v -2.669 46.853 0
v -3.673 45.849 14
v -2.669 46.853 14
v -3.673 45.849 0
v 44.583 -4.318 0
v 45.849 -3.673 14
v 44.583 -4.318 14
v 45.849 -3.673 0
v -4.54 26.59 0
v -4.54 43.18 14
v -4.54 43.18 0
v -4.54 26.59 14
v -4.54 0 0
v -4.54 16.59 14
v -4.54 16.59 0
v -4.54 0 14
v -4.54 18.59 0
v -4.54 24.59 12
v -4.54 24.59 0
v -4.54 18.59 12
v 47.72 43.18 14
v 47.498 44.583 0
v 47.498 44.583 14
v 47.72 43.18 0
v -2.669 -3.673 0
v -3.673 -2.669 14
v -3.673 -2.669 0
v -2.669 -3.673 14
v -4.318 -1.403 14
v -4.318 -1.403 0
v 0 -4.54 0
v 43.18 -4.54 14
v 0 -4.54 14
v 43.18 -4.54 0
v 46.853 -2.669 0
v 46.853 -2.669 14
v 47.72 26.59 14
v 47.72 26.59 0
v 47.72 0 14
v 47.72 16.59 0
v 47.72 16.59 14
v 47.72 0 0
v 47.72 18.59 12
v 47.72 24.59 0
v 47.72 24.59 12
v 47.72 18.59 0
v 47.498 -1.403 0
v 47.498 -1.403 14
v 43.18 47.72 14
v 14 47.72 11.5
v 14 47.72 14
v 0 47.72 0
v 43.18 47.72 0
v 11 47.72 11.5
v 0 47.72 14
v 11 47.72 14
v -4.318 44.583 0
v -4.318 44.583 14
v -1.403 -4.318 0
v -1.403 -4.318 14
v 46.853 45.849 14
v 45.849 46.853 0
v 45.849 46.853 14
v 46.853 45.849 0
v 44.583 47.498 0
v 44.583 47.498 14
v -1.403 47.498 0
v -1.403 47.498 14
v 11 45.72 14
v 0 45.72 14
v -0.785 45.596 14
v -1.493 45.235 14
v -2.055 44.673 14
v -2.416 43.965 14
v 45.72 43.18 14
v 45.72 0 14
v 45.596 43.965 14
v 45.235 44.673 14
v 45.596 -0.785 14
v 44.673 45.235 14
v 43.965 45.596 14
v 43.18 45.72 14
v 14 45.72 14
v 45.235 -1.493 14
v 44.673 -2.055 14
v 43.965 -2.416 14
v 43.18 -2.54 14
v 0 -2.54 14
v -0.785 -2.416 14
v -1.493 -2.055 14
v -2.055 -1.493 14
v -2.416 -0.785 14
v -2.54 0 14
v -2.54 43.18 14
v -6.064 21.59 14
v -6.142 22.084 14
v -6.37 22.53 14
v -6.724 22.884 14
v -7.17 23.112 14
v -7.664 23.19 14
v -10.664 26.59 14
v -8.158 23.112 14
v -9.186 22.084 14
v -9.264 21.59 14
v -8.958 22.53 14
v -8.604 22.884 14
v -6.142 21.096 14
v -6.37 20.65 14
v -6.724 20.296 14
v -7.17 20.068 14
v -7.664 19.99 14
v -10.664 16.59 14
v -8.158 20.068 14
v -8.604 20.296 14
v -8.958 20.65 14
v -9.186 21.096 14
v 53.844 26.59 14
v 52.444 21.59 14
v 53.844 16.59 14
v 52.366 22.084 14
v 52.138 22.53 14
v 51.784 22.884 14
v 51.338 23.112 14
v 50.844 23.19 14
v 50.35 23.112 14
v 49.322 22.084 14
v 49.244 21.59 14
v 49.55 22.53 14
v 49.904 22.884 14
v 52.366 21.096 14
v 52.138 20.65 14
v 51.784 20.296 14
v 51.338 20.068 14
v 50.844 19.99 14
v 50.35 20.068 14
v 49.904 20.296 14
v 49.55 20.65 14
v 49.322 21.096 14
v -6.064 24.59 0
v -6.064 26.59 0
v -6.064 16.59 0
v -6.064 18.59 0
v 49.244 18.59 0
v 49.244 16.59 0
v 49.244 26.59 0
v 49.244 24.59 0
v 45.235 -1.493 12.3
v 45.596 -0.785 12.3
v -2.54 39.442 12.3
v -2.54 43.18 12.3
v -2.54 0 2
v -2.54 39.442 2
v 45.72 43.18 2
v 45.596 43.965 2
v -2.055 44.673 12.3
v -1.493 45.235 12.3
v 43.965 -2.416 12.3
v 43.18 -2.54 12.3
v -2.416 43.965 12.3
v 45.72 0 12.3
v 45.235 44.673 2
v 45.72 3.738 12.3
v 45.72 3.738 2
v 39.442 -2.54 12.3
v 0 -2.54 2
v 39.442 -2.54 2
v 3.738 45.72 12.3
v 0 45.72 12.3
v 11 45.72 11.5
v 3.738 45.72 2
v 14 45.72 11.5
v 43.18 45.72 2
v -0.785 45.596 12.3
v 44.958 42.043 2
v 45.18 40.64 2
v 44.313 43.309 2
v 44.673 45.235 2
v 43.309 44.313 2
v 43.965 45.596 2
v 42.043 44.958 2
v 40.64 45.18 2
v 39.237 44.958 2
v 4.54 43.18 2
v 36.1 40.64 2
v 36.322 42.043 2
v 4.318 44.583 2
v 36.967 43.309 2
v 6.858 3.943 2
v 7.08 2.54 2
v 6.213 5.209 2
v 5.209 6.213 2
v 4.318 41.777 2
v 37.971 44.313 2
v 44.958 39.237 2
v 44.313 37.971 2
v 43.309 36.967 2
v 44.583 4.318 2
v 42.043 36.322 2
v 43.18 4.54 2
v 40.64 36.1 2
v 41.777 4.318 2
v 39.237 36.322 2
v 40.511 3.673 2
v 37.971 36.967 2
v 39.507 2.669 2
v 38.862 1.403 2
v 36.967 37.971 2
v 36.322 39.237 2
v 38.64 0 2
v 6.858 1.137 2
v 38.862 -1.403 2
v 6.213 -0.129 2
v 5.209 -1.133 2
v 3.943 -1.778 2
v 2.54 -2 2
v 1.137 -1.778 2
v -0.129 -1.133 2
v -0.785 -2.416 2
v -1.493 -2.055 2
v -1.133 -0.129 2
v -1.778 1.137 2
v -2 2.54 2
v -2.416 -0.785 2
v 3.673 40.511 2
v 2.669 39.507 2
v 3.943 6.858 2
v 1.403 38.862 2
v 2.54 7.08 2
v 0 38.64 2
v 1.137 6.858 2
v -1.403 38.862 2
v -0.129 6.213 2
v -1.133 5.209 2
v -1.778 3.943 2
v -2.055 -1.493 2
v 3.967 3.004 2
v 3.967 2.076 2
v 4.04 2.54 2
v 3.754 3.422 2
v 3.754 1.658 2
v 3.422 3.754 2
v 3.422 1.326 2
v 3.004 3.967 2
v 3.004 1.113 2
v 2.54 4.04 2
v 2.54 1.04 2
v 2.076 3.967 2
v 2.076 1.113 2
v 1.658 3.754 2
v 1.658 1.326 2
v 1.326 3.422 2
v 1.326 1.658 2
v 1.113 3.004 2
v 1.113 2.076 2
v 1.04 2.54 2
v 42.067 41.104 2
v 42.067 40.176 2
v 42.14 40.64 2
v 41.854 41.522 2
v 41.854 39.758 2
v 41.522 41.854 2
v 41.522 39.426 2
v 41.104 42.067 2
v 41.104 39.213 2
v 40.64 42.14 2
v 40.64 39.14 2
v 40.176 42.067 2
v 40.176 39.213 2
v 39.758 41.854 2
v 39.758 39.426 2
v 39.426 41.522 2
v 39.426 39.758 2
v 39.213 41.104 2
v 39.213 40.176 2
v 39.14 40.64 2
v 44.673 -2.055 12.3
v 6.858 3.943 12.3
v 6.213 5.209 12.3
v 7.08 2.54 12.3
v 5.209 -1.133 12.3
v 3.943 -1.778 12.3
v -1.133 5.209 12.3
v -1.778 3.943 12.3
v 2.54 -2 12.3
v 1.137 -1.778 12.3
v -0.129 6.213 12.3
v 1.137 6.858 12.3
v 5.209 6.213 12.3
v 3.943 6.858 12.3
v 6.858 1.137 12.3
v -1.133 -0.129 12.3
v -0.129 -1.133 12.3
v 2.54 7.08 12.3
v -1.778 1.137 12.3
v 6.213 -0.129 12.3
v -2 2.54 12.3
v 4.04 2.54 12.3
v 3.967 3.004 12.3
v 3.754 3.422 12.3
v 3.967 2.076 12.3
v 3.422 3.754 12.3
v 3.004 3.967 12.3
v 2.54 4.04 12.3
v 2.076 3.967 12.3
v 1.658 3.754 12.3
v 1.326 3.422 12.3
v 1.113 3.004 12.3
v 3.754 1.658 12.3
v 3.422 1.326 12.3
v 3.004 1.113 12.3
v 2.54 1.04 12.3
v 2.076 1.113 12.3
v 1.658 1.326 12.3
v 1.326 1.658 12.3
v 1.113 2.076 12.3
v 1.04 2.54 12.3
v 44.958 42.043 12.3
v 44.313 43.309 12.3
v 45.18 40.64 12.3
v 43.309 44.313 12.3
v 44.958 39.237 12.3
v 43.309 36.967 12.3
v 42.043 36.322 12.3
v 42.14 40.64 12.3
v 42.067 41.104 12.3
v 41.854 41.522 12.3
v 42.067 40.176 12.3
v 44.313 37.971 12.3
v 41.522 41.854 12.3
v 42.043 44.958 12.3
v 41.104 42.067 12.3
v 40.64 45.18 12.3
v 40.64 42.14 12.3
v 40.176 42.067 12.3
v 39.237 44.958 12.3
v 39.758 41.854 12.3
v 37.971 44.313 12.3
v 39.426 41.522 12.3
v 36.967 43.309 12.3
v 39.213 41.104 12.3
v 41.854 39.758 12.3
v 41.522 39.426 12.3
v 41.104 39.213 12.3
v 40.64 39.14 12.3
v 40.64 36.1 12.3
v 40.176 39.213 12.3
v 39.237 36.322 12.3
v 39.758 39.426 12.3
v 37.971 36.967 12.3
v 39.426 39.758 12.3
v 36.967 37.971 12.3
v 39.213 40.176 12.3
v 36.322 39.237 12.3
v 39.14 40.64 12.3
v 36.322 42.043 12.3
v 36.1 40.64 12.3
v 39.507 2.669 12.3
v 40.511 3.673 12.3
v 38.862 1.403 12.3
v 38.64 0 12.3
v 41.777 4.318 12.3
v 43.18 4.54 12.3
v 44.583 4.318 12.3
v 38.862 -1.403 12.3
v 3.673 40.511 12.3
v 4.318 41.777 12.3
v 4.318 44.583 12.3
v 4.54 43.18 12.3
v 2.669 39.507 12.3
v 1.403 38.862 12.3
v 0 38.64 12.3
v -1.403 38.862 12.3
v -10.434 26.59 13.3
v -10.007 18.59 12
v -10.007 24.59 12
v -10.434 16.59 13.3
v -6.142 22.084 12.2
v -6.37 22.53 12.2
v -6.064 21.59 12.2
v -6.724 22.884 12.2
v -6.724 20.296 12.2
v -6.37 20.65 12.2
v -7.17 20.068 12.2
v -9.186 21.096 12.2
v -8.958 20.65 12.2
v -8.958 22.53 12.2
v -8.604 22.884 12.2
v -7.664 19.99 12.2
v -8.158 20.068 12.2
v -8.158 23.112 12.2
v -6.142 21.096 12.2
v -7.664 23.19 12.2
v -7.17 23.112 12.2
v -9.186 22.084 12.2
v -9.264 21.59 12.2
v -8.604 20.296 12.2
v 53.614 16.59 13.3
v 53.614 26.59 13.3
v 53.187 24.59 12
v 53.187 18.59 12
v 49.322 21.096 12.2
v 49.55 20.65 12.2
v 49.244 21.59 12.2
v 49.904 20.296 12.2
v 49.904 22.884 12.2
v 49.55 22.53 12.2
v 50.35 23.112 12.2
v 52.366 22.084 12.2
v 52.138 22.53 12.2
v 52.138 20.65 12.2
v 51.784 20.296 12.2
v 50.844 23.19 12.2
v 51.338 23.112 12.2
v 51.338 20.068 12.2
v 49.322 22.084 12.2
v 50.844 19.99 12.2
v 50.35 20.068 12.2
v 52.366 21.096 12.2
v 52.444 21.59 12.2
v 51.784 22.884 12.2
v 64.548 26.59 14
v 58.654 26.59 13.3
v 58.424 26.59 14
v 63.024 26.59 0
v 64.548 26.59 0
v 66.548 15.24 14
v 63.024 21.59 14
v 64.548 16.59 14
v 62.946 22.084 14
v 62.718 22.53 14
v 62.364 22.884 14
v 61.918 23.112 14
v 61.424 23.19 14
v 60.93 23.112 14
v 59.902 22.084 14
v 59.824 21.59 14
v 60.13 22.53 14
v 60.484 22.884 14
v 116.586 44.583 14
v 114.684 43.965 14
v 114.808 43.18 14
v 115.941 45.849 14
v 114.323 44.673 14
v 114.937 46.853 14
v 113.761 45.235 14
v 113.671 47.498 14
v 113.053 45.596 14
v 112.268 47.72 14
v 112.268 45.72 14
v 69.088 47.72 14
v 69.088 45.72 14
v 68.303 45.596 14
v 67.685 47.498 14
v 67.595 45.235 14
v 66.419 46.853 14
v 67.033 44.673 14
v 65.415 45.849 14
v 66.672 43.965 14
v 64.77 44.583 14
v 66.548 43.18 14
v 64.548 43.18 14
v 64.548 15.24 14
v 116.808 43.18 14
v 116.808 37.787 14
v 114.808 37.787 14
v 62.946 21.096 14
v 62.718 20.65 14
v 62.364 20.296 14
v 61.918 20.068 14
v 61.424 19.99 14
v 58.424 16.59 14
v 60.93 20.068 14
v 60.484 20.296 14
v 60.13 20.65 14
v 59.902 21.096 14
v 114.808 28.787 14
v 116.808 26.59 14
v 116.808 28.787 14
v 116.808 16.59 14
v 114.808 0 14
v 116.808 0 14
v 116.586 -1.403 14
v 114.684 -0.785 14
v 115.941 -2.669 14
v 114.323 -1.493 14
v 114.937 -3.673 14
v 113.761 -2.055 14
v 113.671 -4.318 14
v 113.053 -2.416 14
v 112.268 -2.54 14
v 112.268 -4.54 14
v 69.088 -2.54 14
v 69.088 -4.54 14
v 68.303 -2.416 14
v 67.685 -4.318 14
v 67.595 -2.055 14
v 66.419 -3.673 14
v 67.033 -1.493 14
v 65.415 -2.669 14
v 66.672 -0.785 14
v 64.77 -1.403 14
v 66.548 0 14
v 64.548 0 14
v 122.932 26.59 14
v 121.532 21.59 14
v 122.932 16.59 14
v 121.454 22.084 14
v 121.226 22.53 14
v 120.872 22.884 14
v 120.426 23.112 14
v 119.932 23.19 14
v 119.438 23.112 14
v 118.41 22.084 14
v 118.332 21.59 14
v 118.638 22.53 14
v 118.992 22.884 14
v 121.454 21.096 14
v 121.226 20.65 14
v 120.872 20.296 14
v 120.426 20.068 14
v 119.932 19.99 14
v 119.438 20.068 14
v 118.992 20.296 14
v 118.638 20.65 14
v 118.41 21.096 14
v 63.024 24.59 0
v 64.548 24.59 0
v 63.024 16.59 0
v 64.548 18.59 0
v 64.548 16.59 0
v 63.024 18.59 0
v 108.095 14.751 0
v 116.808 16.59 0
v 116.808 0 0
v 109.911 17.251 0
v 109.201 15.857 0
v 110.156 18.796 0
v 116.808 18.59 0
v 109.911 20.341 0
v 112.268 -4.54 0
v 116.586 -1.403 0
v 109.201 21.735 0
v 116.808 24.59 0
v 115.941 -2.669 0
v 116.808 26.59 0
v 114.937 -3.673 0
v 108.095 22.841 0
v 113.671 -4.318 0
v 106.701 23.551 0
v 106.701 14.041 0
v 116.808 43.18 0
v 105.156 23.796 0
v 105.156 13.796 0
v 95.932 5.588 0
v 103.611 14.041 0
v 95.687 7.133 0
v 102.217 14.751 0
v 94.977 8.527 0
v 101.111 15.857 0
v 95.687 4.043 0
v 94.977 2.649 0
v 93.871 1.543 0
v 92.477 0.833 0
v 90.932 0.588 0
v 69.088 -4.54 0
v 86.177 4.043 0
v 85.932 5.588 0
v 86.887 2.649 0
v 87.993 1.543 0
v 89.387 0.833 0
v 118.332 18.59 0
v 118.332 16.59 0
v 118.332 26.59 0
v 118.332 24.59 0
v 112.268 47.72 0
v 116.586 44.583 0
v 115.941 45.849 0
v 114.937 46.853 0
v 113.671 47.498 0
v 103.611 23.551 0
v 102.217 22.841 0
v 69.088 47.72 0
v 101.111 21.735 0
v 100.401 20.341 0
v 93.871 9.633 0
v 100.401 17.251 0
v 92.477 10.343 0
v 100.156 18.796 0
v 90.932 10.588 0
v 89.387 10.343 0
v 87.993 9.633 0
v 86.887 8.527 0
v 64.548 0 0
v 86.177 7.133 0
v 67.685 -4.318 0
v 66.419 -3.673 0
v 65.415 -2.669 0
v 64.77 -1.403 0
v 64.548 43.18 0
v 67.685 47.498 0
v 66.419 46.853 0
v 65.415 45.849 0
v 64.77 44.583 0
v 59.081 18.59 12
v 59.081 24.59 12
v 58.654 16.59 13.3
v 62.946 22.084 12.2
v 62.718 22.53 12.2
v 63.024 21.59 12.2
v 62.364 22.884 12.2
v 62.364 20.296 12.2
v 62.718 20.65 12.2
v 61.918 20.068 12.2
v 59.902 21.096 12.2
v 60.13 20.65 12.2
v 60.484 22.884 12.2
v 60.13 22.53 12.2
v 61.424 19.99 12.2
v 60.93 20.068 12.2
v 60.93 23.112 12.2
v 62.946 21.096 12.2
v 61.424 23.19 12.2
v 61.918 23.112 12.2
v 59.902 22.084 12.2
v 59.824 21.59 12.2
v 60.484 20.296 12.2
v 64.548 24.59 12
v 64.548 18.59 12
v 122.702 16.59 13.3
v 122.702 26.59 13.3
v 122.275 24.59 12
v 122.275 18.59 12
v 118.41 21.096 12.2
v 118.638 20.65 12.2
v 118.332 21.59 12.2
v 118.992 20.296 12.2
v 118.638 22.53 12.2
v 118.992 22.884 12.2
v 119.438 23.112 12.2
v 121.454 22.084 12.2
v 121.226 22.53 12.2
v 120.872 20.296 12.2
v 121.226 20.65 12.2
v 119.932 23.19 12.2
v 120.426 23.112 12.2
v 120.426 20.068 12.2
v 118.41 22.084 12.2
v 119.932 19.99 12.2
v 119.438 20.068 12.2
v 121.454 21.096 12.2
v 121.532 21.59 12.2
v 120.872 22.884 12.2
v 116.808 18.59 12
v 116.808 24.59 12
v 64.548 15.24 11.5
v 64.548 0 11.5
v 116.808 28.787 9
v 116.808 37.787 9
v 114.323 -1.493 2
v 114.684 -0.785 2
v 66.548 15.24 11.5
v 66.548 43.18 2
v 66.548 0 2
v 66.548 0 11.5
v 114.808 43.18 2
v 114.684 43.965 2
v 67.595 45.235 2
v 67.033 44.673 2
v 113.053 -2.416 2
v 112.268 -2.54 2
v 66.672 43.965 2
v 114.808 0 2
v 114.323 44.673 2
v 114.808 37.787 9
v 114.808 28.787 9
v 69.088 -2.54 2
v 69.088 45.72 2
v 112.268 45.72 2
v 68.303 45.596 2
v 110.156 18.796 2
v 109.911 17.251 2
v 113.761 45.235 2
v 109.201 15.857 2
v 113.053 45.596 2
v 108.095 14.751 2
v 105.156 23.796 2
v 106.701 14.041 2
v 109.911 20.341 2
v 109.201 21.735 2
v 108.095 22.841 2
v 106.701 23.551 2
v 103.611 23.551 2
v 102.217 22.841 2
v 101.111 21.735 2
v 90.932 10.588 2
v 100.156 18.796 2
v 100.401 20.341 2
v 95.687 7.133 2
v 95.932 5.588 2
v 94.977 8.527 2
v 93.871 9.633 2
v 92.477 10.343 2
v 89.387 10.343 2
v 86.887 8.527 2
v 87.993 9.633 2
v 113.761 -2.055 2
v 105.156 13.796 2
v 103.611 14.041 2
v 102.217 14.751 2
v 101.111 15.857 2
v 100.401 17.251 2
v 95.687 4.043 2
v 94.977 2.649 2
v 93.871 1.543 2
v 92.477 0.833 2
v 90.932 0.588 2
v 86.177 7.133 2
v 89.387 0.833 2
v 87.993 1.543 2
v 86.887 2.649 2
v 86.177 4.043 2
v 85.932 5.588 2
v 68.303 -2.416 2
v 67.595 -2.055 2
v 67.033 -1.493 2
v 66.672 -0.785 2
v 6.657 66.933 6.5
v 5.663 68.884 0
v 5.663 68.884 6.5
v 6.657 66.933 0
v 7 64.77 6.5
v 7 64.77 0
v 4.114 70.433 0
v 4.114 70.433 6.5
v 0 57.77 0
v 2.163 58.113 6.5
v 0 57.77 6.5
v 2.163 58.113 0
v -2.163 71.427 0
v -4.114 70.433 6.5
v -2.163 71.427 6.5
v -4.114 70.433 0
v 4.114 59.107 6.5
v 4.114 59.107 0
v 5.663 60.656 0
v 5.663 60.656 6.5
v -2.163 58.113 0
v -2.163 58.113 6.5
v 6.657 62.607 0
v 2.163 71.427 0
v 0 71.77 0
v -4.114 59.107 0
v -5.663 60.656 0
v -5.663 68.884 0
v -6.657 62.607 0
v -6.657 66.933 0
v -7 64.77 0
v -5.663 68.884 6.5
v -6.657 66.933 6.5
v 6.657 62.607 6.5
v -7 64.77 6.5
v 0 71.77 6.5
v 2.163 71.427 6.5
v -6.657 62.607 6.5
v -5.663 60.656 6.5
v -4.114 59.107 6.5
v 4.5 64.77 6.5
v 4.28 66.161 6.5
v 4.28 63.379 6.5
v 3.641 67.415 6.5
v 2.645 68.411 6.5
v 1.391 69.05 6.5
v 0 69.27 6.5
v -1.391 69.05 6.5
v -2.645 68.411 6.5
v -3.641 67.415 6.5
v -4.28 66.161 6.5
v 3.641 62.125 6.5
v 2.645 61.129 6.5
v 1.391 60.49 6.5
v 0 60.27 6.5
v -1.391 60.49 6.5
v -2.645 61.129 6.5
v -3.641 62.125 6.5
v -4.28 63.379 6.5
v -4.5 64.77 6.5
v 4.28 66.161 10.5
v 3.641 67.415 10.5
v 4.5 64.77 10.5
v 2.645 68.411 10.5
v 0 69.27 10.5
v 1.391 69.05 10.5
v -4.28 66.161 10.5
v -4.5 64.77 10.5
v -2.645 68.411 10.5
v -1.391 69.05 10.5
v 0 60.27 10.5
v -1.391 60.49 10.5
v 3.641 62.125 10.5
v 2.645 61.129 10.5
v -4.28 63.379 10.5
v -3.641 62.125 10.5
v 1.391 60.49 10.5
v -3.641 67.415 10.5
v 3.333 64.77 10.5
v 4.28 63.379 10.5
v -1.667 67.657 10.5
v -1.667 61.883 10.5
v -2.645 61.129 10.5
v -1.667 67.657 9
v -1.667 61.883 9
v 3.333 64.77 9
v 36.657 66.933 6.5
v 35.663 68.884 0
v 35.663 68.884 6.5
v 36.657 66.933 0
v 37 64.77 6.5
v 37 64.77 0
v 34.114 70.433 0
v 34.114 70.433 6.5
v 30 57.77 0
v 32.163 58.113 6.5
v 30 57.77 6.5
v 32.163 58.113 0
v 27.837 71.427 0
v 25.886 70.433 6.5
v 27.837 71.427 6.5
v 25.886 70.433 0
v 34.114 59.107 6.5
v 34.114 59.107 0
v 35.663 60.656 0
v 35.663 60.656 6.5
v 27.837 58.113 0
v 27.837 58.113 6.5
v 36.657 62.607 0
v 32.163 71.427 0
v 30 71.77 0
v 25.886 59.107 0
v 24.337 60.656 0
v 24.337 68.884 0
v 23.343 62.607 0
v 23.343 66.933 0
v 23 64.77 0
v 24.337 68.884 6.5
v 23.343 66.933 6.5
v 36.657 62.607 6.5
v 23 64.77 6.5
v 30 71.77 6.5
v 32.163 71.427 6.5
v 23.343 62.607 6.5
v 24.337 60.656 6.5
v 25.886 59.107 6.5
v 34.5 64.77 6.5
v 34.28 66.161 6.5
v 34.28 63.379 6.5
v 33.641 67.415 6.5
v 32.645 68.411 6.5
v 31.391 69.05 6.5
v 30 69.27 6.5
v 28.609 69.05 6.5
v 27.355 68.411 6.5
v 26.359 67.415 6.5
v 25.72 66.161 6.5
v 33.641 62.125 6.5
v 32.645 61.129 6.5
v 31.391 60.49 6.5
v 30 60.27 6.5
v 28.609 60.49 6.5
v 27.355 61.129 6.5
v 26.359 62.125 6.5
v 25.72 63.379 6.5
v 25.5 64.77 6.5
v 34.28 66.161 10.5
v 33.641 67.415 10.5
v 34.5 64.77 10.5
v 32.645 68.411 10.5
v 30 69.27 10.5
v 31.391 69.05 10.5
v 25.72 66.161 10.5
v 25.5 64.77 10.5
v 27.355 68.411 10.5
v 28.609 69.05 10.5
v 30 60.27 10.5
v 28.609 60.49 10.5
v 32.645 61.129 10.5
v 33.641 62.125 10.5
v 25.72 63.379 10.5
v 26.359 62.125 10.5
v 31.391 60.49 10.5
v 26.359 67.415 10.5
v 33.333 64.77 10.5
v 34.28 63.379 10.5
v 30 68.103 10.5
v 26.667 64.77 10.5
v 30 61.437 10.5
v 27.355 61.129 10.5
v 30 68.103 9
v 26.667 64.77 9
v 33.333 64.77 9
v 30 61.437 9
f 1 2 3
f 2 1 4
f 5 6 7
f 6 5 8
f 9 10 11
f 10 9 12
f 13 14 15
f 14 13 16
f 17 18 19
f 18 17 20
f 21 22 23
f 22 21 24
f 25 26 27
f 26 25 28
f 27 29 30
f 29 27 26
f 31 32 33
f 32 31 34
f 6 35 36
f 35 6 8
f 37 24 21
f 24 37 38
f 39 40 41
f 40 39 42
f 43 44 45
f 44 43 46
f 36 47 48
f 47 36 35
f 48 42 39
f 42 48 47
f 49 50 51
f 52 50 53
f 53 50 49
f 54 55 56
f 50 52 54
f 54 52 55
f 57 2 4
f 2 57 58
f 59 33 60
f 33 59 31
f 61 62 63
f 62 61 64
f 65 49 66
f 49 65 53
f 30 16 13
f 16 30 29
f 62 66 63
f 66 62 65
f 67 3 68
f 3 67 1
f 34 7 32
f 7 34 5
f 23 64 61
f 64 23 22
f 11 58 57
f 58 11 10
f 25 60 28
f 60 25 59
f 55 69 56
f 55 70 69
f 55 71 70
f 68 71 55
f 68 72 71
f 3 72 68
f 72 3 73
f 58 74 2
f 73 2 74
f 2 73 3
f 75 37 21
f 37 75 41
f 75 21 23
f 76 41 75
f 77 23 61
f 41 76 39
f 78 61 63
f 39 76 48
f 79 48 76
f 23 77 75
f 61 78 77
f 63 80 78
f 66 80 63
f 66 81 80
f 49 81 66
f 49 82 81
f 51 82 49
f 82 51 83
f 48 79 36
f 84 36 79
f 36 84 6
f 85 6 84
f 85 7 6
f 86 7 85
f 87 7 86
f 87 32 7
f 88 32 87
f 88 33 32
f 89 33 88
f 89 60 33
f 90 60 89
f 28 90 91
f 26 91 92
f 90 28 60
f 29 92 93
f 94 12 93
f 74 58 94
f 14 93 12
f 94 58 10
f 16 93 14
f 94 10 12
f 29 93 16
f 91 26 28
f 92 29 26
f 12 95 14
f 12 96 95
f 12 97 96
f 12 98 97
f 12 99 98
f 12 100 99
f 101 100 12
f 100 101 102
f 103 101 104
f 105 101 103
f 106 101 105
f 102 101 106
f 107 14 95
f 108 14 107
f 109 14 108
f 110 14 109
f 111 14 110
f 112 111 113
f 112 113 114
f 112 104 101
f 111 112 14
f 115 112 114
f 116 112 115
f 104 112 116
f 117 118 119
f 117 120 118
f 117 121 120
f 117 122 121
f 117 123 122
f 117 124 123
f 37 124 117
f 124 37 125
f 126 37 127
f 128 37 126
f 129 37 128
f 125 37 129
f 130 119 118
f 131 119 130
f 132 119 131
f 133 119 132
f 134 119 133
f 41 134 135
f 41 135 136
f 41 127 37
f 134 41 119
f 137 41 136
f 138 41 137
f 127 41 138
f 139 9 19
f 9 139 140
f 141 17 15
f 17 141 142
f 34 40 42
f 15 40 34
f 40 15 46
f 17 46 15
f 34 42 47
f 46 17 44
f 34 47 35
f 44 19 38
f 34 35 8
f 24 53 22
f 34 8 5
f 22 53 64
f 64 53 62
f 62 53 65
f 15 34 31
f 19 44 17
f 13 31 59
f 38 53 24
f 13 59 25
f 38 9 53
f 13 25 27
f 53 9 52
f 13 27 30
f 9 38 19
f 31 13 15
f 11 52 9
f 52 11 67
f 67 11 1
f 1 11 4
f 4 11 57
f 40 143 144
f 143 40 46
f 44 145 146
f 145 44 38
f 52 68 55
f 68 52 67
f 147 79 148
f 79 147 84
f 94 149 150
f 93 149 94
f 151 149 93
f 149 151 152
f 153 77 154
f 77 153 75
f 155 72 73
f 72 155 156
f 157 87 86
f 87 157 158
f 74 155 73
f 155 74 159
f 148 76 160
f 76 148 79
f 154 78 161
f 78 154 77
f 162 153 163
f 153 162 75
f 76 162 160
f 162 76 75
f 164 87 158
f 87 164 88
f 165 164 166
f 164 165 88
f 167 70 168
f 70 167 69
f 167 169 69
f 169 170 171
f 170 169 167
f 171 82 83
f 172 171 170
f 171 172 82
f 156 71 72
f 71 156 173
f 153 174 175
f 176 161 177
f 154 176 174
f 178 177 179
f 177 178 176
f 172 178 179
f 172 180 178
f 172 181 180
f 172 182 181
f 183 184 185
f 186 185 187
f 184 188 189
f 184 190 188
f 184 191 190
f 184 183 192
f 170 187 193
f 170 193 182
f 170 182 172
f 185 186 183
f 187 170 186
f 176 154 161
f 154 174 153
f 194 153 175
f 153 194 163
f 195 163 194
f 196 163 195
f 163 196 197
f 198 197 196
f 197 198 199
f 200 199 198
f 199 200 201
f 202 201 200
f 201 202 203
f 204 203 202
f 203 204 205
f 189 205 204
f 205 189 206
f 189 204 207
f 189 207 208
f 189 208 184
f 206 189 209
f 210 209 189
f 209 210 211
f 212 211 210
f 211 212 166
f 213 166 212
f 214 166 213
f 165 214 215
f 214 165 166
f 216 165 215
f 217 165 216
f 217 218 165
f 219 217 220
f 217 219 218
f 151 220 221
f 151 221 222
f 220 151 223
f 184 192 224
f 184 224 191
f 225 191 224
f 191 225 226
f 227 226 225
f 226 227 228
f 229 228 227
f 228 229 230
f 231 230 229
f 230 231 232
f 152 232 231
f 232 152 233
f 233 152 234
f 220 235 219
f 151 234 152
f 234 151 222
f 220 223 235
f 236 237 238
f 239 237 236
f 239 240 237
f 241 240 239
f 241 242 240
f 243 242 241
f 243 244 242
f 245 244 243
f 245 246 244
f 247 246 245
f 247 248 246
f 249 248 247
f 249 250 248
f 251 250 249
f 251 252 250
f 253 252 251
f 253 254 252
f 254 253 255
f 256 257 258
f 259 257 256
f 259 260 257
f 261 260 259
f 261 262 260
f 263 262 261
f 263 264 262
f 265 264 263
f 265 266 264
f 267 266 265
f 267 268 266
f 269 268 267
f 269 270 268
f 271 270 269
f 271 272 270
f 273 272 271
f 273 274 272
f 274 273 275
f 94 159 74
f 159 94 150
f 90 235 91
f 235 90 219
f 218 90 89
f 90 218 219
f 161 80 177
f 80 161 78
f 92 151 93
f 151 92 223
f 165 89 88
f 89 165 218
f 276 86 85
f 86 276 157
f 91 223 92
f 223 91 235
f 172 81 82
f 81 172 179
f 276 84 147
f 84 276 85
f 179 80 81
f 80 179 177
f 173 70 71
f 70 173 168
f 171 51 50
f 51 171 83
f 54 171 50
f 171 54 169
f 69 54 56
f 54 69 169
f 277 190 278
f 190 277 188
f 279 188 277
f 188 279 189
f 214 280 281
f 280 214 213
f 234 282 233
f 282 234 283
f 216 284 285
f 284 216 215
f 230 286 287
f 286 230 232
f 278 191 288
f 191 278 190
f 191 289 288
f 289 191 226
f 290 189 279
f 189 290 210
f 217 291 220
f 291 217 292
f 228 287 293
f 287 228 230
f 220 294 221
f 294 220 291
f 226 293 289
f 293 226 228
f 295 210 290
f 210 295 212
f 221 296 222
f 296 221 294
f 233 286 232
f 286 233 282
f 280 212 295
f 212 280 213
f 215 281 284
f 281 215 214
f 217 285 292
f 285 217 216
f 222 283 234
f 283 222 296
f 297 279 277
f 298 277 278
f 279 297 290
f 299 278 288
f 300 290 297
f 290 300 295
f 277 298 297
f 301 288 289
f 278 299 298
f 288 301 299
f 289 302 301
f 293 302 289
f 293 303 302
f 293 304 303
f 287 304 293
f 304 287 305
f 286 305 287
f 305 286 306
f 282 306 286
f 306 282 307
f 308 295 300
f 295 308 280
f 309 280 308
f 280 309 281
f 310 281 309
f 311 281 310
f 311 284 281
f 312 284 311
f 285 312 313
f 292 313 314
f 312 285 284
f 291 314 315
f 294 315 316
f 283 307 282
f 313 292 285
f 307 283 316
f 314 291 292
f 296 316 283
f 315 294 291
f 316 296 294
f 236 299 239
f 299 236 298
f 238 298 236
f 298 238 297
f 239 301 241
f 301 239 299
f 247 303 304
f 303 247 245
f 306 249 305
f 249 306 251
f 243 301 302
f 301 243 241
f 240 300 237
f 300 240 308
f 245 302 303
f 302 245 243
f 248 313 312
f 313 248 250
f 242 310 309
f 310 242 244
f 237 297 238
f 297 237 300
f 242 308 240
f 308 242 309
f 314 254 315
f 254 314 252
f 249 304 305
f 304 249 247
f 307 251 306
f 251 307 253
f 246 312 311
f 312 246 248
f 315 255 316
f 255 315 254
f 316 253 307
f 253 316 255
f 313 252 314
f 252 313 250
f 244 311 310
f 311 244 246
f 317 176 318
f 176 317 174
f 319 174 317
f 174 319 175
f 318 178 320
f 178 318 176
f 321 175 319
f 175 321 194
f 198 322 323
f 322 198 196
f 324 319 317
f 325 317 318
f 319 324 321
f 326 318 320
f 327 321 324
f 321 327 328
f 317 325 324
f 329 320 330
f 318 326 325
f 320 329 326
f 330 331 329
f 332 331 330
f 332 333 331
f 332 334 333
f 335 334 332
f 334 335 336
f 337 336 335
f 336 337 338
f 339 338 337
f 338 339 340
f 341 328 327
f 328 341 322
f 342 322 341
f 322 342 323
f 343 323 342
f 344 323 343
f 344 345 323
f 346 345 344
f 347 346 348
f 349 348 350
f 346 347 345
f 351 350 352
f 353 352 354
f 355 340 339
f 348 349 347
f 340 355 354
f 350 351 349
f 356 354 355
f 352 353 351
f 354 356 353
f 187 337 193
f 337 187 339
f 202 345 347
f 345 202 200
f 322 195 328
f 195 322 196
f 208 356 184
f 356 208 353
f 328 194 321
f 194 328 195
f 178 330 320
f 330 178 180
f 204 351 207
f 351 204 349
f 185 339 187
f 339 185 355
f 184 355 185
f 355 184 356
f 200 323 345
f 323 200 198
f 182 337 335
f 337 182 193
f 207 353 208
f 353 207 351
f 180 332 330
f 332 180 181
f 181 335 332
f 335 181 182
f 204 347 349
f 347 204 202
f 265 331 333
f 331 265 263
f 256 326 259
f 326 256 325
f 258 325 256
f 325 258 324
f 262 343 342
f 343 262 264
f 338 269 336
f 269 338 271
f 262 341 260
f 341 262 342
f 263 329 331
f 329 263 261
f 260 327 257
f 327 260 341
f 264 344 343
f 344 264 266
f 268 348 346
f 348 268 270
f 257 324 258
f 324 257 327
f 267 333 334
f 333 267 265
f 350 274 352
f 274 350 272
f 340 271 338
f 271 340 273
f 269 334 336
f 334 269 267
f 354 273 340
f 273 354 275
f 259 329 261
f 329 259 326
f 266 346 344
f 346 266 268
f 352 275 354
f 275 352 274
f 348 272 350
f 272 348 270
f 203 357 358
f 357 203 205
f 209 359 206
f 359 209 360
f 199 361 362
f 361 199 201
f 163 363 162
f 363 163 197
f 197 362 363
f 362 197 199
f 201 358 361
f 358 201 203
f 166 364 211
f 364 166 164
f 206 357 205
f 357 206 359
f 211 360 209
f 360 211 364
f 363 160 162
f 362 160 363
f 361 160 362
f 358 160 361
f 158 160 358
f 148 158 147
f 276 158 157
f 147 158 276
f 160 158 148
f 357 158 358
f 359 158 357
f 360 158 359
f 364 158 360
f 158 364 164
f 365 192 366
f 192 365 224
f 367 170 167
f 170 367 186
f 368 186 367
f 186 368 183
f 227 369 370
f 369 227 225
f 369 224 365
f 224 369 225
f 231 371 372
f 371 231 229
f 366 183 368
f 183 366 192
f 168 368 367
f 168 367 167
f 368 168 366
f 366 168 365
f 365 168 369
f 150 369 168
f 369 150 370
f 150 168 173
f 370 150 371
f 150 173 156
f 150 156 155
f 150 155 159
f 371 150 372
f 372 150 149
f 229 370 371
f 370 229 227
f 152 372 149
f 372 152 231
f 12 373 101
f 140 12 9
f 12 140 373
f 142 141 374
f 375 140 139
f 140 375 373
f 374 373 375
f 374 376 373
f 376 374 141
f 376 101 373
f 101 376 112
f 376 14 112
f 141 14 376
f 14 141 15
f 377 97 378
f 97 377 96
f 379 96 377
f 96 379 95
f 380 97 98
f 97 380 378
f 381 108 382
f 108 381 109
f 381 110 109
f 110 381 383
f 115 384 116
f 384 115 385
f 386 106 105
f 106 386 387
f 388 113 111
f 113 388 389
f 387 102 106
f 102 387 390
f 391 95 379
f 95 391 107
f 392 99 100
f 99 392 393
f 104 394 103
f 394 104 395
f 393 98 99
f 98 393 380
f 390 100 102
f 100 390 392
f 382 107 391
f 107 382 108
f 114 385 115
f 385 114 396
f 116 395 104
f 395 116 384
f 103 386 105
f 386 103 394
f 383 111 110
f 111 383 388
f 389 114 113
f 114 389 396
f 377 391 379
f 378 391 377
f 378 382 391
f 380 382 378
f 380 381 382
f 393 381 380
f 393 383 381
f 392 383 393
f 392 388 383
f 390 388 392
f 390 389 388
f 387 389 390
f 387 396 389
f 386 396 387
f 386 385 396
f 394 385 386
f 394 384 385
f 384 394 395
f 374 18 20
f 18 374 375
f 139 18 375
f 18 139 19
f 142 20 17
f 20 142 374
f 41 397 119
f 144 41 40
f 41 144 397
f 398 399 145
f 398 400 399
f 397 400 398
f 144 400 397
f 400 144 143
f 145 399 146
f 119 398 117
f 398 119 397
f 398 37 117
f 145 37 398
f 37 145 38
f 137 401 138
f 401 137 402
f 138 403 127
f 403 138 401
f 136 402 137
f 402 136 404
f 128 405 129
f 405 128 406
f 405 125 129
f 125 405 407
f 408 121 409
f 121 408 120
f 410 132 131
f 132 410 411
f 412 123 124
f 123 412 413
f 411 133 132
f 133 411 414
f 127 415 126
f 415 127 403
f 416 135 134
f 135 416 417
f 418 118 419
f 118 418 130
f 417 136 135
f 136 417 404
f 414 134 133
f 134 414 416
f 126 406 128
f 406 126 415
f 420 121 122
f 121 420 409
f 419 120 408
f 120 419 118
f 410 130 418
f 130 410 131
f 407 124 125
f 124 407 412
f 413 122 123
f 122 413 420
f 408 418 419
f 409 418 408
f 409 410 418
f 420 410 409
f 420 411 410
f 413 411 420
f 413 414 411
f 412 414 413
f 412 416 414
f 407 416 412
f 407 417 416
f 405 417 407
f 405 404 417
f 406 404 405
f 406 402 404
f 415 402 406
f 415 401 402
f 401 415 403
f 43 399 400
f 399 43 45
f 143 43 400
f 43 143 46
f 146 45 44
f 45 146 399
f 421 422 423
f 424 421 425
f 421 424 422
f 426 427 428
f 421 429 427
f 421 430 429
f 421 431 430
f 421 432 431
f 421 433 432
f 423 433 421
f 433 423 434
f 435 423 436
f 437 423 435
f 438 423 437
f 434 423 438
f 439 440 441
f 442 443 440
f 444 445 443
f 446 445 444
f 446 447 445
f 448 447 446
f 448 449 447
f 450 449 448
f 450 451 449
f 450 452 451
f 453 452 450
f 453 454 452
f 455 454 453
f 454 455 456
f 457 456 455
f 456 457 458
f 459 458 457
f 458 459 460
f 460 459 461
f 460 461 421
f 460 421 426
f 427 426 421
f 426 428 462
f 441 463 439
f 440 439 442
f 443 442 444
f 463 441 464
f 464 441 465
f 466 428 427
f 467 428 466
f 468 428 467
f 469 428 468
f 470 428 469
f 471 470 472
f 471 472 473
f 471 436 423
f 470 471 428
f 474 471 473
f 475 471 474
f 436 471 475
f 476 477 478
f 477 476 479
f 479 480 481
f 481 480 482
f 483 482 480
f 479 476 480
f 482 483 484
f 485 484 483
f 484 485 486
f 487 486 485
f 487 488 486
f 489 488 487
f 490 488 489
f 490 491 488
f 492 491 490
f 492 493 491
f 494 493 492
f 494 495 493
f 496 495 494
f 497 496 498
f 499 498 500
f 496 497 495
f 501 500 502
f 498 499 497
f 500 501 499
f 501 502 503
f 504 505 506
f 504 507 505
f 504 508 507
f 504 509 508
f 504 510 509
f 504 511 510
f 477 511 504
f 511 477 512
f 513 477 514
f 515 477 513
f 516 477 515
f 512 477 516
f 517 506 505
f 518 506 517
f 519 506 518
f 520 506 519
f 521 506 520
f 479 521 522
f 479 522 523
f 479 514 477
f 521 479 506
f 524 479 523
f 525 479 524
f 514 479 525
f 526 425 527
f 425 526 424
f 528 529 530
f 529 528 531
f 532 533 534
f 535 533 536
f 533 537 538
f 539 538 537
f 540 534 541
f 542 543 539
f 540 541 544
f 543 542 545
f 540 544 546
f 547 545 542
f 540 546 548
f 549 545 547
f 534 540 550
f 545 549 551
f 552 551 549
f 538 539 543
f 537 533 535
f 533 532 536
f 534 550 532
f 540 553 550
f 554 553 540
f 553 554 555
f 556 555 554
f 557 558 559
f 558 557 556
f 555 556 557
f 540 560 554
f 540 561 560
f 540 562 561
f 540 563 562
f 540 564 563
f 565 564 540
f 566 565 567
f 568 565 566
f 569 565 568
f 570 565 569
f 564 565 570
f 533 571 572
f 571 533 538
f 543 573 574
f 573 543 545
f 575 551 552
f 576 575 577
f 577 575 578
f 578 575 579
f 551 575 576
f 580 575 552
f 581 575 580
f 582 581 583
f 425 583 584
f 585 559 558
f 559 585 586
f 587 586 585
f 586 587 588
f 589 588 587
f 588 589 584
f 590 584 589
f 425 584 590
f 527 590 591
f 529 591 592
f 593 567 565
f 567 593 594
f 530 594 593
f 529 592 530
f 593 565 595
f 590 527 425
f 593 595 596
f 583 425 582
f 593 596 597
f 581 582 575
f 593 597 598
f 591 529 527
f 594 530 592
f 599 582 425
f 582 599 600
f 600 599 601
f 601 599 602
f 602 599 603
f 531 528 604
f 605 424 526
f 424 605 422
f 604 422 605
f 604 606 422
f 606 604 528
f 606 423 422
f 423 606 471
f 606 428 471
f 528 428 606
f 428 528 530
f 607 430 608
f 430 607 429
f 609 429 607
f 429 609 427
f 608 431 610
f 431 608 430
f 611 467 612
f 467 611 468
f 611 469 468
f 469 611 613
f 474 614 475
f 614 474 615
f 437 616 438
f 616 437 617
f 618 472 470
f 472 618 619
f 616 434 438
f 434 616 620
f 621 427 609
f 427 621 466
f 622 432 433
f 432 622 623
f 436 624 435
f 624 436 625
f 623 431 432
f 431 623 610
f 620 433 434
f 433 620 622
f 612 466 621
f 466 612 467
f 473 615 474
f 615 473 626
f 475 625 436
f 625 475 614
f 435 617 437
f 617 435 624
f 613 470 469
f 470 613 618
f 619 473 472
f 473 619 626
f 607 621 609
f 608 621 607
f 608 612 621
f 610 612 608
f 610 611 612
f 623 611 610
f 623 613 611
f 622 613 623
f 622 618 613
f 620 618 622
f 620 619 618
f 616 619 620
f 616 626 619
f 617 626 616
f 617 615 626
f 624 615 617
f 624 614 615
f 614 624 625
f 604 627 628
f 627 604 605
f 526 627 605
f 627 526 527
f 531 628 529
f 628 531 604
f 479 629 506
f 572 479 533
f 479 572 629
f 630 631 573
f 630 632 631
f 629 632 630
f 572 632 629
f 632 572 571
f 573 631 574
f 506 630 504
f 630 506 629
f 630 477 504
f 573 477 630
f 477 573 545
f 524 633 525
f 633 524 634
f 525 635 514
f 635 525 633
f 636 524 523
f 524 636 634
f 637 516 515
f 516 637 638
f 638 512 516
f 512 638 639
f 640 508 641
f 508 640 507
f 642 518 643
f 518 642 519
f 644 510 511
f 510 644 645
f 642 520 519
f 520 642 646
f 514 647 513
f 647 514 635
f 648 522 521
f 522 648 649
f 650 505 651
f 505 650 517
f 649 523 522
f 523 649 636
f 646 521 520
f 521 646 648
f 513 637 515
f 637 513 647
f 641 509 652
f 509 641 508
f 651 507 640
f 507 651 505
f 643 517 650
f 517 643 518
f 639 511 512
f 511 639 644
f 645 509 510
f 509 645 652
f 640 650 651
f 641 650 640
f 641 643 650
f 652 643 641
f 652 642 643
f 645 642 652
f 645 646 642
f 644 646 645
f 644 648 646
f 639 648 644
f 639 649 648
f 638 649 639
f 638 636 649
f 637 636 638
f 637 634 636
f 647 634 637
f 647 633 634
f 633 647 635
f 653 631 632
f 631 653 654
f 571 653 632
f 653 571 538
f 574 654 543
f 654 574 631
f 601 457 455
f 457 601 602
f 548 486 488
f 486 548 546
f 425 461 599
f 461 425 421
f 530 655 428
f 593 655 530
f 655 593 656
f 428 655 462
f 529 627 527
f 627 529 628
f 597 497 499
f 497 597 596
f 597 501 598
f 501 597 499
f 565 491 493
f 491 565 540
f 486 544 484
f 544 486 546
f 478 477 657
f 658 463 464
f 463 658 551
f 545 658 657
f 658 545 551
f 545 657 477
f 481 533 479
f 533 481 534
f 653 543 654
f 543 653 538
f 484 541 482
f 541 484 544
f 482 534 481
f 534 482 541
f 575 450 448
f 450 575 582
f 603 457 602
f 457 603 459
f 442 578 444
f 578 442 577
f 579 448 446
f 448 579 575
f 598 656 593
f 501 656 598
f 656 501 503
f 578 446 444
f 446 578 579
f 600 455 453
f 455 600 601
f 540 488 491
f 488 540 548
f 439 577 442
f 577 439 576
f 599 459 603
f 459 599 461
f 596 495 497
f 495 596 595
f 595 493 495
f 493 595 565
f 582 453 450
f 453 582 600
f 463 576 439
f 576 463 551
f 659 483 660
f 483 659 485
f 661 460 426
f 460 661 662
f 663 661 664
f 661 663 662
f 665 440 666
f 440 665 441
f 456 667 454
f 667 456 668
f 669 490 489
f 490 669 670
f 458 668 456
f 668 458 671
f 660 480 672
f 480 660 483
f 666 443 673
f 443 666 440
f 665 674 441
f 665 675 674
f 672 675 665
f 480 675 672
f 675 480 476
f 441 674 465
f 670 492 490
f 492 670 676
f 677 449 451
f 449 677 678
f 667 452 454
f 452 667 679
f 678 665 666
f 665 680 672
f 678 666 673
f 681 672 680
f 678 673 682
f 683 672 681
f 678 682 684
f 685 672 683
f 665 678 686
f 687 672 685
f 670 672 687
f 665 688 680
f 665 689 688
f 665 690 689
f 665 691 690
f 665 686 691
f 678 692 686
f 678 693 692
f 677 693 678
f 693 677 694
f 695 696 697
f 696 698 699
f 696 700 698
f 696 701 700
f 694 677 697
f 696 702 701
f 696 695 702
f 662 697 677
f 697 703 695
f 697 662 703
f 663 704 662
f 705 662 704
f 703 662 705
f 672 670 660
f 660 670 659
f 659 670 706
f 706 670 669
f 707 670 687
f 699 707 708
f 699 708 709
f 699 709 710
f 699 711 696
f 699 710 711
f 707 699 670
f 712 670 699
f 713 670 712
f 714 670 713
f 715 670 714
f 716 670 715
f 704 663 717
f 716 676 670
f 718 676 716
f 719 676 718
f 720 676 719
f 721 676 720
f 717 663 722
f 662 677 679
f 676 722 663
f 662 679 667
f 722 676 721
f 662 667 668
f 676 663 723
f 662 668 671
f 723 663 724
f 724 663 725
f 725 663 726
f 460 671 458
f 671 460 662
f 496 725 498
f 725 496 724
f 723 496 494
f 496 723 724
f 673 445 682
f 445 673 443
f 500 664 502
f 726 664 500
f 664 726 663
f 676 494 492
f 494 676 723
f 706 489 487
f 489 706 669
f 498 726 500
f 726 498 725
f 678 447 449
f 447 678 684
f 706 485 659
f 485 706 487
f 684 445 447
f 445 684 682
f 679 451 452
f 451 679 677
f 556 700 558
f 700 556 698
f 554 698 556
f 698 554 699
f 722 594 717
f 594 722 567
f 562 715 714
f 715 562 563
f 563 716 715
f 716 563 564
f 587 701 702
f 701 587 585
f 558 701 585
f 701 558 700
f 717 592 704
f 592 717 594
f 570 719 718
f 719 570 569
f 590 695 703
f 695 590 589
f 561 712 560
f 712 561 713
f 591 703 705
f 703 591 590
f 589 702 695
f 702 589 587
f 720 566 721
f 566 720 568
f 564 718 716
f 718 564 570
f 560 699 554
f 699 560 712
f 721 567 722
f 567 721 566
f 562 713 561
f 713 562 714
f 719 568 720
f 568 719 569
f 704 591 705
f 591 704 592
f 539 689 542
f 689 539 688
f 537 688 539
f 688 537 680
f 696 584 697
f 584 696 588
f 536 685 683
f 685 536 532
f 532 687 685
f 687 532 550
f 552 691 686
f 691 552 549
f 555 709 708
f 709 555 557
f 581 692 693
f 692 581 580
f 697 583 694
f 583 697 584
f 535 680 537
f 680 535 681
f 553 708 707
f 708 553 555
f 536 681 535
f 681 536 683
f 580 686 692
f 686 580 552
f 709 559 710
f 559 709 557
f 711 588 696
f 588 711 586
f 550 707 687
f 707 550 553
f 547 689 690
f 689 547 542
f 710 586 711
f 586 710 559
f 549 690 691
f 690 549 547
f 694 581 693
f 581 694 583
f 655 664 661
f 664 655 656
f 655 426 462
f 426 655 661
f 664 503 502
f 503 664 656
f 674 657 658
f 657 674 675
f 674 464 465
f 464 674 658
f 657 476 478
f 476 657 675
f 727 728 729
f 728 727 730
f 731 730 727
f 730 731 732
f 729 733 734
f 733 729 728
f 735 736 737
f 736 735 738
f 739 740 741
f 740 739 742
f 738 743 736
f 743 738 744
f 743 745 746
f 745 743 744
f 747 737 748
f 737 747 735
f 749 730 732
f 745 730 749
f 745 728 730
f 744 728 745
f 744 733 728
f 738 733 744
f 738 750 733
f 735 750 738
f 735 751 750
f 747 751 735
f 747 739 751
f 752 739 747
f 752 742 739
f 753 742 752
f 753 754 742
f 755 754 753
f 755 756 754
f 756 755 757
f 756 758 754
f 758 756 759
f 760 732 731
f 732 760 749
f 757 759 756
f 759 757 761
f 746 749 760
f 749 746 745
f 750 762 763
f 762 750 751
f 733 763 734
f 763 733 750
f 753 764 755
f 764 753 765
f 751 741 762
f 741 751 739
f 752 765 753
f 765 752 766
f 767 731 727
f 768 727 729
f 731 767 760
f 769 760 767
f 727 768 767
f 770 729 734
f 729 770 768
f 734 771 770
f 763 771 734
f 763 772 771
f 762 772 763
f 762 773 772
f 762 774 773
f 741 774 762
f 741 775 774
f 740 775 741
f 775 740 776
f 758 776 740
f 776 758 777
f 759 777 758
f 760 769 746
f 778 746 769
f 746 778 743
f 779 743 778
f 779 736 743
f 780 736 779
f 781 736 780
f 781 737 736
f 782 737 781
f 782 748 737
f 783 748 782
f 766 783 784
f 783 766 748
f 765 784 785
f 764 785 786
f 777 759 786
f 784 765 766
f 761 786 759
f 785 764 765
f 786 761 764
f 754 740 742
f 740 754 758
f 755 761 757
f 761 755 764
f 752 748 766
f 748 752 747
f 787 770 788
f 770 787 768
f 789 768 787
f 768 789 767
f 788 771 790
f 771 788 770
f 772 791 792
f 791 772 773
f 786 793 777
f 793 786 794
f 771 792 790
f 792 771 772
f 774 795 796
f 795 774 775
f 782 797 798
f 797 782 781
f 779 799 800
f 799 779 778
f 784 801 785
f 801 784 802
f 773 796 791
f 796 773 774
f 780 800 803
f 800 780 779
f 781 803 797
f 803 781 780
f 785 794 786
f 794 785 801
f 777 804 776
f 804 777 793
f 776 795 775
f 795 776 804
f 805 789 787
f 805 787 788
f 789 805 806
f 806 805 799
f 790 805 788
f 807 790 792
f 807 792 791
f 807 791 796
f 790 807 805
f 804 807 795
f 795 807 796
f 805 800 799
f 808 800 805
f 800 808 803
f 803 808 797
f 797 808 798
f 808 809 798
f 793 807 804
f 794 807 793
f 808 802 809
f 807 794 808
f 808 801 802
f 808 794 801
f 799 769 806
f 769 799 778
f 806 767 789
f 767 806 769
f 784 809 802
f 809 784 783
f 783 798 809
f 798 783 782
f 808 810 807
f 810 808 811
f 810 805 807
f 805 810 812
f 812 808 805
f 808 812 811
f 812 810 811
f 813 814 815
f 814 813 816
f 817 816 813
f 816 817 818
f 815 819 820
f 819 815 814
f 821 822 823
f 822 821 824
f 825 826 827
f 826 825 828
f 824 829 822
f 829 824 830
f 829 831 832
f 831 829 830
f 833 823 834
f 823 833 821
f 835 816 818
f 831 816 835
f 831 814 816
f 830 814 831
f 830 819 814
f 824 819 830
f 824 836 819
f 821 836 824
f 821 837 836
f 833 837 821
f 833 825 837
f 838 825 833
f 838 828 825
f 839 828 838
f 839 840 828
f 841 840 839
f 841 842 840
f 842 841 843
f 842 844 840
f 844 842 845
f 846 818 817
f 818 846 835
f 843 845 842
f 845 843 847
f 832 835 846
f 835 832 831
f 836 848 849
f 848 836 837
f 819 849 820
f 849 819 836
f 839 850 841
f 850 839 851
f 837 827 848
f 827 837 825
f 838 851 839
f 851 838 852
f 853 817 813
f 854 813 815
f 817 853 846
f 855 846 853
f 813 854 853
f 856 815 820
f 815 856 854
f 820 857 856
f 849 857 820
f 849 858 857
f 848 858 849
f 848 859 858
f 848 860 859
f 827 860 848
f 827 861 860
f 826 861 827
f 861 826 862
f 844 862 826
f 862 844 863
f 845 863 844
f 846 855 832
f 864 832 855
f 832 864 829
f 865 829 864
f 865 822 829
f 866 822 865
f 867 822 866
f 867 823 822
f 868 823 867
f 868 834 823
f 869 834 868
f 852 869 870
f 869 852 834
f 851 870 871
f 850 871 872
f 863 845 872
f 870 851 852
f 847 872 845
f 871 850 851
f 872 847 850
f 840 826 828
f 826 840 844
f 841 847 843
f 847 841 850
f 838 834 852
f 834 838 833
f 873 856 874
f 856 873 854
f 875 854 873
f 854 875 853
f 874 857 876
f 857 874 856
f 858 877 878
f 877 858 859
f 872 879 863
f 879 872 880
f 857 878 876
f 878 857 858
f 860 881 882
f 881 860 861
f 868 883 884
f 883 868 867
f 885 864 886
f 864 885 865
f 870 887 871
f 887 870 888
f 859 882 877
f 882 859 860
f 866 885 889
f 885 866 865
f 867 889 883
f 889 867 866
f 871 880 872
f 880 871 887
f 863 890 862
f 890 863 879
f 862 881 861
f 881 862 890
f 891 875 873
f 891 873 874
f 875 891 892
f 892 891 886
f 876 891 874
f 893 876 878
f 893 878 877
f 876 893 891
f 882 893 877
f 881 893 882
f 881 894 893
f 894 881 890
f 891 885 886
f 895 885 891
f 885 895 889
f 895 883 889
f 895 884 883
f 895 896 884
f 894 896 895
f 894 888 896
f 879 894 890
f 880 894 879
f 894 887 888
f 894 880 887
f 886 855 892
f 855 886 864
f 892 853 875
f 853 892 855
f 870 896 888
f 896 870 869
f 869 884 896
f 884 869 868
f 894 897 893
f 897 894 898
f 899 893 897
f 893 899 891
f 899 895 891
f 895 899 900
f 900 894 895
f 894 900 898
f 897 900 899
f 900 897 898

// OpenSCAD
//These are the pieces for a enclosure for the profeVen class management beacon. It's got a base, a lid and two buttons.

//parameters
side = 43.180;
roundCorner = 2.54;
screwHoleRadius = 1.5;
throughHoleRadius = 1.6;
wallThickness = 2;
baseHeight= 14;
$fn = 20;
buttonHoleRadius = 5;
pushButtonHeight = 5.5; //this is the height of the push Button, higher pcb buttons, shorter printed buttons.
xPosButtonHoleStart = 21.336;
yPosButtonHoleStart = 5.588;

xPosButtonHoleReset = 7.112;
yPosButtonHoleReset = 18.796;
connectorHole = 15.240;

//All the pieces/////
base();
translate ([side*1.6,0,0]) lid();
translate([0,side*1.5,0]) buttons();
//////////////

//base
//it's a difference between two rounded corner boxes plus some things
module base(){
    difference(){
        extBox();
        translate([0,0,wallThickness])pcbHole();
        //cable hole
        translate ([11,side,baseHeight-2.5]) cube([3,6,3]);
    }
    pcbStands();
    translate([-roundCorner*1.6,side/2,baseHeight/2])baseMountStands();
    translate([side+roundCorner*1.6,side/2,baseHeight/2])rotate([0,0,180]) baseMountStands();
}

//lid
//the same as the base, minus some things
module lid(){
    difference(){
        extBox();
        translate([0,0,wallThickness])pcbHole();
        //hole Button start
        translate([side-xPosButtonHoleStart,yPosButtonHoleStart,-1]) cylinder(r=buttonHoleRadius,h=4);
        //hole Button reset
        translate([side-xPosButtonHoleReset,yPosButtonHoleReset,-1]) cylinder(r=buttonHoleRadius,h=4);
        //hole connector
        translate ([-6,0,baseHeight-2.5]) cube([6,connectorHole,3]);
         //switch Hole
        translate ([side,side/1.5,baseHeight-5]) cube([6,9,6]);
    }
    //baseMount Stands
    translate([-roundCorner*1.6,side/2,baseHeight/2])baseMountStands();
    translate([side+roundCorner*1.6,side/2,baseHeight/2])rotate([0,0,180]) baseMountStands();

}





//button
//simple cylinders with symbols
module buttons(){
    //startButton
    difference(){
        union(){
            cylinder(r=buttonHoleRadius+wallThickness,h=baseHeight-wallThickness-pushButtonHeight);
            cylinder(r=buttonHoleRadius*0.9,h=baseHeight+wallThickness-pushButtonHeight);
            }
        translate([0,0,9]) cylinder(r=buttonHoleRadius/1.5,h=wallThickness,$fn=3);
     }
    //resetButton
   translate([30,0,0]) difference(){
        union(){
            cylinder(r=buttonHoleRadius+wallThickness,h=baseHeight-wallThickness-pushButtonHeight);
            cylinder(r=buttonHoleRadius*0.9,h=baseHeight+wallThickness-pushButtonHeight);
        }
        translate([0,0,9]) cylinder(r=buttonHoleRadius/1.5,h=wallThickness,$fn=4);
   }
}

//exterior box
module extBox(){
    hull(){
        cylinder (r=roundCorner+wallThickness, h = baseHeight);
        translate ([side,0,0]) cylinder (r=roundCorner+wallThickness, h = baseHeight);
        translate ([side,side,0]) cylinder (r=roundCorner+wallThickness, h = baseHeight);
        translate ([0,side,0]) cylinder (r=roundCorner+wallThickness, h = baseHeight);
    }
}

//pcb hole
module pcbHole(){
    hull(){
        cylinder (r=roundCorner, h = 16);
        translate ([side,0,0]) cylinder (r=roundCorner, h = 16);
        translate ([side,side,0]) cylinder (r=roundCorner, h = 16);
        translate ([0,side,0]) cylinder (r=roundCorner, h = 16);
    }
}

//pcb stands
module pcbStands(){
    difference(){
        translate([2.54,2.54,0])cylinder (r=roundCorner+wallThickness, h = baseHeight-1.7);
        translate([2.54,2.54,wallThickness]) cylinder (r=screwHoleRadius, h = baseHeight);
    }
    translate ([side,0,0]) cylinder (r=roundCorner+wallThickness, h = baseHeight-1.7);
    difference(){
        translate ([side-2.54,side-2.54,0]) cylinder (r=roundCorner+wallThickness, h = baseHeight-1.7);
        translate([side-2.54,side-2.54,wallThickness]) cylinder (r=screwHoleRadius, h = baseHeight);
    }
    translate ([0,side,0]) cylinder (r=roundCorner+wallThickness, h = baseHeight-1.7);
}
//base mount stands
module baseMountStands(){
    difference(){
        linear_extrude(height = baseHeight, center = true, convexity = 10, scale=[3.3,1])
        translate ([-1,0,0]) square([2,10],true);
        translate ([-3.6,0,baseHeight-8.8]) cylinder(r=throughHoleRadius,h=baseHeight);
        translate ([-3,0,-2]) cube([6,6,baseHeight],true);
}
}
